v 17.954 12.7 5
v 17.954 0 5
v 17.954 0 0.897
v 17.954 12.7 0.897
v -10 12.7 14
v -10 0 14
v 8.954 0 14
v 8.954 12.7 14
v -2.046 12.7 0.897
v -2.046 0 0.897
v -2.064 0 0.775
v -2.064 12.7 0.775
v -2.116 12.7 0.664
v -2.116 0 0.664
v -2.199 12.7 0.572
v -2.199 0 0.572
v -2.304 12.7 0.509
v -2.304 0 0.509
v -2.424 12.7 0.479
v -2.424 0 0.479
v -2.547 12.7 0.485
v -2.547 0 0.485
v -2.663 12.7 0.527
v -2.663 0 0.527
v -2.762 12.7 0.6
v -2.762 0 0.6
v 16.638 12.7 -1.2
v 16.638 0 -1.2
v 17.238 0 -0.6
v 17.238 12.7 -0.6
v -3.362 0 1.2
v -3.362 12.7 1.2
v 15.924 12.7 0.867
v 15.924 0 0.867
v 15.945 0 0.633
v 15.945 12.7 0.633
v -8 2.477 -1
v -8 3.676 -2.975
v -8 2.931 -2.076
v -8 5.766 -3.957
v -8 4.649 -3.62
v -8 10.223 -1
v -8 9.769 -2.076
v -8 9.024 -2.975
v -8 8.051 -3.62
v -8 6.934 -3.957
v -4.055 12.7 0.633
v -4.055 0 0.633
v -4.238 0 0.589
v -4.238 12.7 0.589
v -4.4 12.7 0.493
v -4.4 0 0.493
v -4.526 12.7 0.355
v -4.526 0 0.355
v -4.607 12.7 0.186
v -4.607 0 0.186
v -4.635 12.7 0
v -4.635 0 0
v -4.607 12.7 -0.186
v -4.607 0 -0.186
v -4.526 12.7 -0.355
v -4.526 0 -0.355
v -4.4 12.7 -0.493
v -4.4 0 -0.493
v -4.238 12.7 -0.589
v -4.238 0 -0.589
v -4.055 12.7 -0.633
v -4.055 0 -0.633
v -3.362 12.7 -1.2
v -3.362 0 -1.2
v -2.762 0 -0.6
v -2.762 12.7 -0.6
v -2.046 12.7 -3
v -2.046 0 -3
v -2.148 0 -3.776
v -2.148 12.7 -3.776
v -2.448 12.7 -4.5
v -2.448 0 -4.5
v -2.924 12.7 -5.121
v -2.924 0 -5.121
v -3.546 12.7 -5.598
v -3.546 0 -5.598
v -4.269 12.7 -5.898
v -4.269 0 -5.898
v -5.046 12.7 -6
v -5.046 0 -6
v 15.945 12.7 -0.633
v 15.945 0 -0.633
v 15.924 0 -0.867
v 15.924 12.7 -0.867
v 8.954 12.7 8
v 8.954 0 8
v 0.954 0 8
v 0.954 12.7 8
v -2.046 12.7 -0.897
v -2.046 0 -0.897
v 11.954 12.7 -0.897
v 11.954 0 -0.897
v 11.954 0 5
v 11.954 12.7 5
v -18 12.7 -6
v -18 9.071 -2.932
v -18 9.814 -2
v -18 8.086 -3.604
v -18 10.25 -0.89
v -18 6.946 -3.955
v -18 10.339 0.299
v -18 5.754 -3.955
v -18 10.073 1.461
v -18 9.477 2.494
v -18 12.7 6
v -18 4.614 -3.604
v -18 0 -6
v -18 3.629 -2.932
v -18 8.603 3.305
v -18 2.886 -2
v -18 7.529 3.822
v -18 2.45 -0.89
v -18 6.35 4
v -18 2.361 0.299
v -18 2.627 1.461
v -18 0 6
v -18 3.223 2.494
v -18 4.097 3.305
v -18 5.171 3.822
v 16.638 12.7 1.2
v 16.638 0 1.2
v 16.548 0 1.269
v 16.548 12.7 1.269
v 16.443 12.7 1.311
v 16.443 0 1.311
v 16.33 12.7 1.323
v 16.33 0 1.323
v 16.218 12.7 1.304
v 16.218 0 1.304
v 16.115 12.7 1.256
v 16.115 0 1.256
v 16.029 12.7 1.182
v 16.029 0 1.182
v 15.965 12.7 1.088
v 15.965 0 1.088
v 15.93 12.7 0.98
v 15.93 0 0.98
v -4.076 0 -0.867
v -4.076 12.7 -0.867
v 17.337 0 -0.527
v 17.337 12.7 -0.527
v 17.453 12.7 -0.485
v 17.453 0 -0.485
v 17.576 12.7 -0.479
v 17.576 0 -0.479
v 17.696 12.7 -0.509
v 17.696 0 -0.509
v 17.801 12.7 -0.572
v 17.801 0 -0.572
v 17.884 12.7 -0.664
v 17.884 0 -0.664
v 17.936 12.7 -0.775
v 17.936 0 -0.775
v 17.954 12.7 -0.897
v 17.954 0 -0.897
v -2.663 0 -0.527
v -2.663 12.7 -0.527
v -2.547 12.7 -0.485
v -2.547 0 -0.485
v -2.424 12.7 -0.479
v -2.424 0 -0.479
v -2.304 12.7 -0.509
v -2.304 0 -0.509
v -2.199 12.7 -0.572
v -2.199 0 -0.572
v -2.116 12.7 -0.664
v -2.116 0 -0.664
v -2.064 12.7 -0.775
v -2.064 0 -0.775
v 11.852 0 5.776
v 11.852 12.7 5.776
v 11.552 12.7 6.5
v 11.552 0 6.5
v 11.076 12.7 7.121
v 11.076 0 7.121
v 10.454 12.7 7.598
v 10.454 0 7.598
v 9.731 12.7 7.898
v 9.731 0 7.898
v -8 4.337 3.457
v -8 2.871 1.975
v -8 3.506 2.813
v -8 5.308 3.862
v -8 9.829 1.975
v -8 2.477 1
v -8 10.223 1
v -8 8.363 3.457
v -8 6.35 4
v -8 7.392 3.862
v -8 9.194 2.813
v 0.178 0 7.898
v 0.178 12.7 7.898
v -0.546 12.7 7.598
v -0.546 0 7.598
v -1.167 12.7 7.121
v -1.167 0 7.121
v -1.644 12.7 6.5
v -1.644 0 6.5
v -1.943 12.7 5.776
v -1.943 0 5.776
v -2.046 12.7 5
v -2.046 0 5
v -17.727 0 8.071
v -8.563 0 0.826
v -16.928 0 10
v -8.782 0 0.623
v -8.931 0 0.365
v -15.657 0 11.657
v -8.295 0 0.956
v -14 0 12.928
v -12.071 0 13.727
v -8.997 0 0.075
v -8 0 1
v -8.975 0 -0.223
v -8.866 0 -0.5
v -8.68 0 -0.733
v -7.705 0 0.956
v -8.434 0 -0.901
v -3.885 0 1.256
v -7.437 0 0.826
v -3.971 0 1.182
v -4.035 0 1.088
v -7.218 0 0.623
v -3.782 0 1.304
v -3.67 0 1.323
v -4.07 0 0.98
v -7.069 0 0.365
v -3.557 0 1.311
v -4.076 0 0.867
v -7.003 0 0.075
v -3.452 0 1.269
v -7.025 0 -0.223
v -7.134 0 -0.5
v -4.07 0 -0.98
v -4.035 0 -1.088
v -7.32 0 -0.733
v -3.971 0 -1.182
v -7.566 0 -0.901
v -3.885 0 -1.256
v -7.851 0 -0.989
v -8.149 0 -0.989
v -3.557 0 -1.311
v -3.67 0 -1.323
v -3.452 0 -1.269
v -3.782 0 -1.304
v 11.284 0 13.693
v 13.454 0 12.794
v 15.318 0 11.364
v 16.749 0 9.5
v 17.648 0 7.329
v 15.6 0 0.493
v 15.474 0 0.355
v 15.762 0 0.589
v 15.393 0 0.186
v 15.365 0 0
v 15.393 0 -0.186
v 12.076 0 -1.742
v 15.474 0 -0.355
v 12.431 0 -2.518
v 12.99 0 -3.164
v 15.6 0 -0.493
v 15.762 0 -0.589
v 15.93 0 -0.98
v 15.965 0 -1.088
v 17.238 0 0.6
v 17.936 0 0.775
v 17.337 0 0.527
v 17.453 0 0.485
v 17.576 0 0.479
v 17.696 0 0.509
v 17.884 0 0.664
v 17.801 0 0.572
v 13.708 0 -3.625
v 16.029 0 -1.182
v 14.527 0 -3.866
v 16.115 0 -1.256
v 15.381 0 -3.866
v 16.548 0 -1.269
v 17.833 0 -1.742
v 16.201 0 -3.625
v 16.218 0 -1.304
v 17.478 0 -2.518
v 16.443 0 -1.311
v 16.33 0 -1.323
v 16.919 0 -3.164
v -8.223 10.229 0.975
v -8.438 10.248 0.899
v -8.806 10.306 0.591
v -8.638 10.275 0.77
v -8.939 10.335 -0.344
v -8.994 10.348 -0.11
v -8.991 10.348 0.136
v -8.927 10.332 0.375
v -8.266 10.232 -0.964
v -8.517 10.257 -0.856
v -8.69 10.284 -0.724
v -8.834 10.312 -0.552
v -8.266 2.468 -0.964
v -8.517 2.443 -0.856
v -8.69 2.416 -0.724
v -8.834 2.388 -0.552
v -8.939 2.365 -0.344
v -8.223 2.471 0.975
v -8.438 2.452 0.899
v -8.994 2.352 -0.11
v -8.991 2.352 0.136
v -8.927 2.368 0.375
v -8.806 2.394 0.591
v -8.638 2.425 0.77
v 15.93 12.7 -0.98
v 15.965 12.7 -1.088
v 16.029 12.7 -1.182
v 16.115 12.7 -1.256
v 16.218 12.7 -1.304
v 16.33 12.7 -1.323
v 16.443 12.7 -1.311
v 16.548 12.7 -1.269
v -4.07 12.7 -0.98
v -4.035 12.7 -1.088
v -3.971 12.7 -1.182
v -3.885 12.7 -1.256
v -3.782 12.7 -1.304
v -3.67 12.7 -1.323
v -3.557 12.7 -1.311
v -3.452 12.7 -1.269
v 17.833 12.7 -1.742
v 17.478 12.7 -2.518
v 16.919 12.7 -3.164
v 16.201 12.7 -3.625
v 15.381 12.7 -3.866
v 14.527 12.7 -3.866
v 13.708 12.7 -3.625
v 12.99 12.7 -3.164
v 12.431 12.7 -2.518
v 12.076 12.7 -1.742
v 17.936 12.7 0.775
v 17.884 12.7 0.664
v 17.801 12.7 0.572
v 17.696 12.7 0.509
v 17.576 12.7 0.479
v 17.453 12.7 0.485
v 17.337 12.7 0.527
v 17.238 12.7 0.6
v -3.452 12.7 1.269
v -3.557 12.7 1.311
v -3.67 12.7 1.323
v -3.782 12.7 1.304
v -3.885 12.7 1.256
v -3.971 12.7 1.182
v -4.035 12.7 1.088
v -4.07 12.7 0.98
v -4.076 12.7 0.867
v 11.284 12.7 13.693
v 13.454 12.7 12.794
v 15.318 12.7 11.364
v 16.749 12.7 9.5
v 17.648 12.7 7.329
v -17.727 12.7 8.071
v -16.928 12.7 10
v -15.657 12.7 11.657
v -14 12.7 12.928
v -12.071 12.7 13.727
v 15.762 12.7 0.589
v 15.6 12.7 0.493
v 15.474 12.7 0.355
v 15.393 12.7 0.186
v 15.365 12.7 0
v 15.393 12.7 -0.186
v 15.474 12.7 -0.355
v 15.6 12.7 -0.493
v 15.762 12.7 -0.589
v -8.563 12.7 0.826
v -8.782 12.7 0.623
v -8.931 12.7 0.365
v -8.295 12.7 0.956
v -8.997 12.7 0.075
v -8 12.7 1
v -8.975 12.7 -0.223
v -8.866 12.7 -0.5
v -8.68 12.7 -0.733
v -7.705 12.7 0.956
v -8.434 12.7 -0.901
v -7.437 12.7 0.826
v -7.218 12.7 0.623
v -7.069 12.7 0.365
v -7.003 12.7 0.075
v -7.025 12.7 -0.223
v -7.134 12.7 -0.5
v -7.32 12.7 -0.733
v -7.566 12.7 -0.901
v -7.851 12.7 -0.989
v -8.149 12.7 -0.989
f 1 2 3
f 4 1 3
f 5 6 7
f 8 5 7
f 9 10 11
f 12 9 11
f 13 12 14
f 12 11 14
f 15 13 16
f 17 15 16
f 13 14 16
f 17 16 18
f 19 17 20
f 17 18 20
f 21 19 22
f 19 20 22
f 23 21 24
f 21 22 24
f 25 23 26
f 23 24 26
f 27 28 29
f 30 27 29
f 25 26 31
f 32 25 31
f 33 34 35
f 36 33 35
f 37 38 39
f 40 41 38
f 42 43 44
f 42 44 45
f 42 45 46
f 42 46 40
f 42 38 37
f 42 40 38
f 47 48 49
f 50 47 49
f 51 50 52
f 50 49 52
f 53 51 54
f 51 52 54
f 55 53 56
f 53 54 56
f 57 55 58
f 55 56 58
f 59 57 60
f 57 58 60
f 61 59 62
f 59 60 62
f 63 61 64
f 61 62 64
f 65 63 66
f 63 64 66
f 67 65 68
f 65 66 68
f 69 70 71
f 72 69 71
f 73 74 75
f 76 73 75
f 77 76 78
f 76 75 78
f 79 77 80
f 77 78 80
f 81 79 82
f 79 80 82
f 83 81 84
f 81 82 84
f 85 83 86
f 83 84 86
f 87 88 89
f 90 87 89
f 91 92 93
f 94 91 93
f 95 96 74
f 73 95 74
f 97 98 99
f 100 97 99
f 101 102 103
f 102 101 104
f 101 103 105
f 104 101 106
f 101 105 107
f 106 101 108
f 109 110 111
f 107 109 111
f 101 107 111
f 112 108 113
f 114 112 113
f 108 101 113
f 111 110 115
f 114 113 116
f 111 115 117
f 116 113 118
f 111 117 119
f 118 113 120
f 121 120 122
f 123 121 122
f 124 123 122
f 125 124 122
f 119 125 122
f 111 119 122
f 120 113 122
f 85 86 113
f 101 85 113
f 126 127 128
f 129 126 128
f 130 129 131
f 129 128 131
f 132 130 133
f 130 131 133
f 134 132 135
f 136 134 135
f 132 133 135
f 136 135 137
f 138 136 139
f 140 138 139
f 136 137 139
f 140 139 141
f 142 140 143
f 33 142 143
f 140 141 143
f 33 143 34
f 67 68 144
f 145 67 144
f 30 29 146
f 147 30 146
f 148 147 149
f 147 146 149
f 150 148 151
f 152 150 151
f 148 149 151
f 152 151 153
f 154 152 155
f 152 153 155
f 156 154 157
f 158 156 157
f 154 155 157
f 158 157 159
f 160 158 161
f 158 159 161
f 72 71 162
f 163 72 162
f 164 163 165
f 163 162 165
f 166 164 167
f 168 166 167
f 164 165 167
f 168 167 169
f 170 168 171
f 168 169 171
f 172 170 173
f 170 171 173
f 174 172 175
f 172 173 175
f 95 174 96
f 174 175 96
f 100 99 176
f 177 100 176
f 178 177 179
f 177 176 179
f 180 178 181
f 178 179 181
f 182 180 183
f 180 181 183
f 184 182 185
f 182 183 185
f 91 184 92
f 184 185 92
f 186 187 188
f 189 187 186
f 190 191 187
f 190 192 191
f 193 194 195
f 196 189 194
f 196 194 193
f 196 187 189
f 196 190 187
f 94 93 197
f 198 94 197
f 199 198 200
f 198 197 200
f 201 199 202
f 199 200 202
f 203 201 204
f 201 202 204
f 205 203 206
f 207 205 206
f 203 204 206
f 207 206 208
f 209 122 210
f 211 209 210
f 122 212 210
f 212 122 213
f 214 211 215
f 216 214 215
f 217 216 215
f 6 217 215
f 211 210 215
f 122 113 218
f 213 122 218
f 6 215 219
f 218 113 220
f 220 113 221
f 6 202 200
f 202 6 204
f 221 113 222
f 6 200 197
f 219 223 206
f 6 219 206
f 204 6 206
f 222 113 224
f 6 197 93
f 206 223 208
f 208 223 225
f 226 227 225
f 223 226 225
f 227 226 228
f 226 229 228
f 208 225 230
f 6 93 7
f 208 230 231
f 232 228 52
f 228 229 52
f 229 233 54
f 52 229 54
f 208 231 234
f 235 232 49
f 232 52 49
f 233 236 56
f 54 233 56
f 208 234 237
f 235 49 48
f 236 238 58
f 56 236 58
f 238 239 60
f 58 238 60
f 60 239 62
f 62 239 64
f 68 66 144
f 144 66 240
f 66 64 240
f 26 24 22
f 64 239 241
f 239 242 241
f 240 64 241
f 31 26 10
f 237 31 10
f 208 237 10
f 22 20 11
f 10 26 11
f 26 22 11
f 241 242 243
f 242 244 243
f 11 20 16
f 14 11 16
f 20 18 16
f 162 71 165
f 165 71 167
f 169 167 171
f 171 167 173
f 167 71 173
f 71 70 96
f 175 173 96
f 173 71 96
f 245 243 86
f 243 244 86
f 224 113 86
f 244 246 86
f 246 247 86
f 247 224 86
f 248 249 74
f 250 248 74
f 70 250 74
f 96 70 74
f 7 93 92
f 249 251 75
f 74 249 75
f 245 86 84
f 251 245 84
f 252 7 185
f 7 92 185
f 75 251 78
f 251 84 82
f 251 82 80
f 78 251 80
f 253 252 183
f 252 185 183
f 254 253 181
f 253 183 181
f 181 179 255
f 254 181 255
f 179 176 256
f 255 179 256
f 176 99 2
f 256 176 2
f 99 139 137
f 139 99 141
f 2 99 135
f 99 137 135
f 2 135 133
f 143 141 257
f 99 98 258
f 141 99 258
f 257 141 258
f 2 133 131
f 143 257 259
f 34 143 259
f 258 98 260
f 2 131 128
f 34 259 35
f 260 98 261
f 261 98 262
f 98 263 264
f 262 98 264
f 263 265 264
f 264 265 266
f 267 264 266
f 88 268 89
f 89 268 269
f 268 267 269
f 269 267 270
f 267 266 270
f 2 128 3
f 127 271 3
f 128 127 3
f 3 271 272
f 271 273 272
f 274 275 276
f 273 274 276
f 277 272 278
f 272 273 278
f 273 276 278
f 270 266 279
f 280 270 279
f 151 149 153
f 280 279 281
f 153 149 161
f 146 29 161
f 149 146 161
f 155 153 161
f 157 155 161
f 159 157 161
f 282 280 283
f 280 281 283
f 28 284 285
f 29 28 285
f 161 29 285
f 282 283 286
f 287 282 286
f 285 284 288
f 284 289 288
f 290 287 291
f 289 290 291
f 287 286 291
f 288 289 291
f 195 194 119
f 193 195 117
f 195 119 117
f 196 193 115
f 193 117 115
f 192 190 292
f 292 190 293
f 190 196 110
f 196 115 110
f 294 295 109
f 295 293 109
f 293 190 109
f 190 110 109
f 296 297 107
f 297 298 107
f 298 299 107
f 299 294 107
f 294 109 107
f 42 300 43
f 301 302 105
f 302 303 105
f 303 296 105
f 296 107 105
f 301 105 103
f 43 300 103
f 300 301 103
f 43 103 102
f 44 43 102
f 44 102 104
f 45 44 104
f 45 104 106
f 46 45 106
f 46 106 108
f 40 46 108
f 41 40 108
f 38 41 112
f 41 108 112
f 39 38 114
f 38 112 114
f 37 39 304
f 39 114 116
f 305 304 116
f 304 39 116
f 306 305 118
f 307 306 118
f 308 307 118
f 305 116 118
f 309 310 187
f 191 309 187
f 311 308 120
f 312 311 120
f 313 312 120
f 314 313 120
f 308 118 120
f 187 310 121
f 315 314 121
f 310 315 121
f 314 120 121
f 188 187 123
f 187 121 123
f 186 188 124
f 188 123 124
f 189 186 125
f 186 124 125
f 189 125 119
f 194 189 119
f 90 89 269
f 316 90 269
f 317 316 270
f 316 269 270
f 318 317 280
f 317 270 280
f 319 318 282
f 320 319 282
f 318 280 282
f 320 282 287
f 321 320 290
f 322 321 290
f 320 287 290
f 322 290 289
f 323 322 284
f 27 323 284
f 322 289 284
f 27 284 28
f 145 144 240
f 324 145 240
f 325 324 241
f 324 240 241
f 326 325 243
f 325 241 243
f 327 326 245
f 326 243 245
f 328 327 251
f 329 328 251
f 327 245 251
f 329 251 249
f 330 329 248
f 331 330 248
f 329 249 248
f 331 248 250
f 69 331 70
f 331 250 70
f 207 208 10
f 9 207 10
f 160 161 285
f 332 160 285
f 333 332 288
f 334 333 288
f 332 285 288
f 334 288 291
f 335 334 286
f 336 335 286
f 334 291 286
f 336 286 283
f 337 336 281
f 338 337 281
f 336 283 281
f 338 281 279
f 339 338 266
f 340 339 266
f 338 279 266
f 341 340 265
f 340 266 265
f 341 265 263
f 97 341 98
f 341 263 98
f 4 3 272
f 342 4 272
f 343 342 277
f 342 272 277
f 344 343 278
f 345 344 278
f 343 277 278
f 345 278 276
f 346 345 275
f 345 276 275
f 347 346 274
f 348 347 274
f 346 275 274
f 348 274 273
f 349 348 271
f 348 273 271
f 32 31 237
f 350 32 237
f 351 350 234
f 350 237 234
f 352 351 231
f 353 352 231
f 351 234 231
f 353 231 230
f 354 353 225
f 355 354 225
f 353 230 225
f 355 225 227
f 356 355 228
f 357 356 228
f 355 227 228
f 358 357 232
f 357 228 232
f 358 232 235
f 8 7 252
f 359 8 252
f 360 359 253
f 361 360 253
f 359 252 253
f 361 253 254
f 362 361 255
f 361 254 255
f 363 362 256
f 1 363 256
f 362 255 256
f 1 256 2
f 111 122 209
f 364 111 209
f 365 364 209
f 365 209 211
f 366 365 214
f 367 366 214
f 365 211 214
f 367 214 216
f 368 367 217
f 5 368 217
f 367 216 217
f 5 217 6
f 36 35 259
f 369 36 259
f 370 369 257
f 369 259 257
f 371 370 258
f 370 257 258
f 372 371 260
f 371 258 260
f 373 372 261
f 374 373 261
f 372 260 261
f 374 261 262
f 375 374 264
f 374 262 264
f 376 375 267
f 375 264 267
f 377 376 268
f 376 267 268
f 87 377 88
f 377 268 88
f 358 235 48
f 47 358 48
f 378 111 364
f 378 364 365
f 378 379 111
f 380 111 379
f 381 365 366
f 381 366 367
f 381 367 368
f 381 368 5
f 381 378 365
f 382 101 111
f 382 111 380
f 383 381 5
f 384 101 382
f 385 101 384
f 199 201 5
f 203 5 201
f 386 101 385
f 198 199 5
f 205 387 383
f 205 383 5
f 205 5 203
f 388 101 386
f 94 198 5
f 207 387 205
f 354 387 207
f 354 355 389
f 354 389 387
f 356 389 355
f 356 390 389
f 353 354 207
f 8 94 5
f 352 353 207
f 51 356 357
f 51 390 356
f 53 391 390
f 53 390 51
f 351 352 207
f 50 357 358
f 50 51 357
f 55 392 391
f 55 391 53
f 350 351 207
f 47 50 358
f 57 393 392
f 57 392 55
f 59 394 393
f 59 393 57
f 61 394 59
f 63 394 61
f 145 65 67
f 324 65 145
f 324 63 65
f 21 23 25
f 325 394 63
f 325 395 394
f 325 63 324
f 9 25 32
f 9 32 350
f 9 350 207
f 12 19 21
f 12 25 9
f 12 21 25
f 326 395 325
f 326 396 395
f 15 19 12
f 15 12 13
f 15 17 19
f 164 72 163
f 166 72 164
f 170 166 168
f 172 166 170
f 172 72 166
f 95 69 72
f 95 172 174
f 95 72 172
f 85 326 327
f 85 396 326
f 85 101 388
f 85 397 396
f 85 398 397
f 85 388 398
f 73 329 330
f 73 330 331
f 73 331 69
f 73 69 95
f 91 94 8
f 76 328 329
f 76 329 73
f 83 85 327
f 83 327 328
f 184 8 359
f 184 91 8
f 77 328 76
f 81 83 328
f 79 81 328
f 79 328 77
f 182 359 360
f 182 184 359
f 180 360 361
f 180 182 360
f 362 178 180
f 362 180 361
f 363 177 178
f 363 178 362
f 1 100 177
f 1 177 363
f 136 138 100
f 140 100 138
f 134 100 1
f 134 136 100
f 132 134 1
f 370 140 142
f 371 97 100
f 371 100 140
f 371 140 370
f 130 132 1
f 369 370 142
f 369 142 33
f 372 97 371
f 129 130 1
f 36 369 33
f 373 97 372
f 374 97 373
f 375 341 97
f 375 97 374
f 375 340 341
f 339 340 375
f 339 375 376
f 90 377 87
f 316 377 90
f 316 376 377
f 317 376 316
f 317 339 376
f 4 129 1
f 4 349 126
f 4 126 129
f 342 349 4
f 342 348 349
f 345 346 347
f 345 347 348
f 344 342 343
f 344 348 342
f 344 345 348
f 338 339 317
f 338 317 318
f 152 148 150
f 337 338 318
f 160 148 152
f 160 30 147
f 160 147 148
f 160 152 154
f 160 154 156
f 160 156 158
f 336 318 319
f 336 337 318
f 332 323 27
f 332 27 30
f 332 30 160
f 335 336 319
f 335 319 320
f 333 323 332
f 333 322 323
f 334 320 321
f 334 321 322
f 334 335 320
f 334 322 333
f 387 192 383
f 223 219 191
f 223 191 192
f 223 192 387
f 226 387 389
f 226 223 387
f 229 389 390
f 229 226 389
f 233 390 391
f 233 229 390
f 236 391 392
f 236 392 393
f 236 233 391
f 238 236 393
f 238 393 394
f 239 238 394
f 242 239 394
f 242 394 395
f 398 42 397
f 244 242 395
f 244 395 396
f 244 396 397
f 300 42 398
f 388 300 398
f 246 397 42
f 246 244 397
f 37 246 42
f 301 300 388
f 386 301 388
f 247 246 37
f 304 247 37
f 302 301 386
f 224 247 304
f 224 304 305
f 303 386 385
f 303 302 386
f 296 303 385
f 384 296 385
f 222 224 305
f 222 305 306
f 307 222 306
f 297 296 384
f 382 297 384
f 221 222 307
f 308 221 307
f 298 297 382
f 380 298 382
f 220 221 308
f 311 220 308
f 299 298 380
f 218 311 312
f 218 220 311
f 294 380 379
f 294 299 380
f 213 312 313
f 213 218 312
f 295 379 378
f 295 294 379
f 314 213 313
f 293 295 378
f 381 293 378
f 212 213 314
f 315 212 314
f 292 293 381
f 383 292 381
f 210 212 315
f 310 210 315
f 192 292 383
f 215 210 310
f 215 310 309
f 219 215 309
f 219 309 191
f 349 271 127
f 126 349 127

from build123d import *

# Parameters (mm, degrees)
SKETCH1_R           = 1
BOSS_EXTRUDE1_DEPTH = 12.7
SKETCH2_R           = 4
CUT_EXTRUDE1_DEPTH  = 10


with BuildPart() as part:
    # Sketch1 → Boss-Extrude1 (new body)
    with BuildSketch(Plane(origin=(0, 0, 0), x_dir=(1, 0, 0), z_dir=(0, 1, 0))):
        with BuildLine():
            Line((-4.055343897, 0.632583633), (-4.075844459, 0.866906139))
            ThreePointArc((-4.075844459, 0.866906139), (-3.83530083, 1.283539926), (-3.361522369, 1.2))
            Line((-3.361522369, 1.2), (-2.761522369, 0.6))
            ThreePointArc((-2.761522369, 0.6), (-2.304491577, 0.509090923), (-2.04560443, 0.89654292))
            Line((-2.04560443, 0.89654292), (-2.04560443, 3))
            ThreePointArc((-2.04560443, 3), (-2.924284086, 5.121320344), (-5.04560443, 6))
            Line((-5.04560443, 6), (-18, 6))
            Line((-18, 6), (-18, -6))
            ThreePointArc((-18, -6), (-15.656854249, -11.656854249), (-10, -14))
            Line((-10, -14), (8.95439557, -14))
            ThreePointArc((8.95439557, -14), (15.318356601, -11.363961031), (17.95439557, -5))
            Line((17.95439557, -5), (17.95439557, -0.89654292))
            ThreePointArc((17.95439557, -0.89654292), (17.695508423, -0.509090923), (17.238477631, -0.6))
            Line((17.238477631, -0.6), (16.638477631, -1.2))
            ThreePointArc((16.638477631, -1.2), (16.16469917, -1.283539926), (15.924155541, -0.866906139))
            Line((15.924155541, -0.866906139), (15.944656103, -0.632583633))
            ThreePointArc((15.944656103, -0.632583633), (15.365, 0), (15.944656103, 0.632583633))
            Line((15.944656103, 0.632583633), (15.924155541, 0.866906139))
            ThreePointArc((15.924155541, 0.866906139), (16.16469917, 1.283539926), (16.638477631, 1.2))
            Line((16.638477631, 1.2), (17.238477631, 0.6))
            ThreePointArc((17.238477631, 0.6), (17.695508423, 0.509090923), (17.95439557, 0.89654292))
            ThreePointArc((17.95439557, 0.89654292), (14.95439557, 3.89654292), (11.95439557, 0.89654292))
            Line((11.95439557, 0.89654292), (11.95439557, -5))
            ThreePointArc((11.95439557, -5), (11.075715914, -7.121320344), (8.95439557, -8))
            Line((8.95439557, -8), (0.95439557, -8))
            ThreePointArc((0.95439557, -8), (-1.166924773, -7.121320344), (-2.04560443, -5))
            Line((-2.04560443, -5), (-2.04560443, -0.89654292))
            ThreePointArc((-2.04560443, -0.89654292), (-2.304491577, -0.509090923), (-2.761522369, -0.6))
            Line((-2.761522369, -0.6), (-3.361522369, -1.2))
            ThreePointArc((-3.361522369, -1.2), (-3.83530083, -1.283539926), (-4.075844459, -0.866906139))
            Line((-4.075844459, -0.866906139), (-4.055343897, -0.632583633))
            ThreePointArc((-4.055343897, -0.632583633), (-4.635, 0), (-4.055343897, 0.632583633))
        make_face()
        with Locations(Location((-8, 0, 0), (0, 0, 270))):
            Circle(SKETCH1_R, mode=Mode.SUBTRACT)
    extrude(amount=BOSS_EXTRUDE1_DEPTH)

    # Sketch2 → Cut-Extrude1 (cut)
    with BuildSketch(Plane.ZY.offset(18)):
        with Locations((0, 6.35)):
            Circle(SKETCH2_R)
    extrude(amount=-CUT_EXTRUDE1_DEPTH, mode=Mode.SUBTRACT)


solid = part.part
